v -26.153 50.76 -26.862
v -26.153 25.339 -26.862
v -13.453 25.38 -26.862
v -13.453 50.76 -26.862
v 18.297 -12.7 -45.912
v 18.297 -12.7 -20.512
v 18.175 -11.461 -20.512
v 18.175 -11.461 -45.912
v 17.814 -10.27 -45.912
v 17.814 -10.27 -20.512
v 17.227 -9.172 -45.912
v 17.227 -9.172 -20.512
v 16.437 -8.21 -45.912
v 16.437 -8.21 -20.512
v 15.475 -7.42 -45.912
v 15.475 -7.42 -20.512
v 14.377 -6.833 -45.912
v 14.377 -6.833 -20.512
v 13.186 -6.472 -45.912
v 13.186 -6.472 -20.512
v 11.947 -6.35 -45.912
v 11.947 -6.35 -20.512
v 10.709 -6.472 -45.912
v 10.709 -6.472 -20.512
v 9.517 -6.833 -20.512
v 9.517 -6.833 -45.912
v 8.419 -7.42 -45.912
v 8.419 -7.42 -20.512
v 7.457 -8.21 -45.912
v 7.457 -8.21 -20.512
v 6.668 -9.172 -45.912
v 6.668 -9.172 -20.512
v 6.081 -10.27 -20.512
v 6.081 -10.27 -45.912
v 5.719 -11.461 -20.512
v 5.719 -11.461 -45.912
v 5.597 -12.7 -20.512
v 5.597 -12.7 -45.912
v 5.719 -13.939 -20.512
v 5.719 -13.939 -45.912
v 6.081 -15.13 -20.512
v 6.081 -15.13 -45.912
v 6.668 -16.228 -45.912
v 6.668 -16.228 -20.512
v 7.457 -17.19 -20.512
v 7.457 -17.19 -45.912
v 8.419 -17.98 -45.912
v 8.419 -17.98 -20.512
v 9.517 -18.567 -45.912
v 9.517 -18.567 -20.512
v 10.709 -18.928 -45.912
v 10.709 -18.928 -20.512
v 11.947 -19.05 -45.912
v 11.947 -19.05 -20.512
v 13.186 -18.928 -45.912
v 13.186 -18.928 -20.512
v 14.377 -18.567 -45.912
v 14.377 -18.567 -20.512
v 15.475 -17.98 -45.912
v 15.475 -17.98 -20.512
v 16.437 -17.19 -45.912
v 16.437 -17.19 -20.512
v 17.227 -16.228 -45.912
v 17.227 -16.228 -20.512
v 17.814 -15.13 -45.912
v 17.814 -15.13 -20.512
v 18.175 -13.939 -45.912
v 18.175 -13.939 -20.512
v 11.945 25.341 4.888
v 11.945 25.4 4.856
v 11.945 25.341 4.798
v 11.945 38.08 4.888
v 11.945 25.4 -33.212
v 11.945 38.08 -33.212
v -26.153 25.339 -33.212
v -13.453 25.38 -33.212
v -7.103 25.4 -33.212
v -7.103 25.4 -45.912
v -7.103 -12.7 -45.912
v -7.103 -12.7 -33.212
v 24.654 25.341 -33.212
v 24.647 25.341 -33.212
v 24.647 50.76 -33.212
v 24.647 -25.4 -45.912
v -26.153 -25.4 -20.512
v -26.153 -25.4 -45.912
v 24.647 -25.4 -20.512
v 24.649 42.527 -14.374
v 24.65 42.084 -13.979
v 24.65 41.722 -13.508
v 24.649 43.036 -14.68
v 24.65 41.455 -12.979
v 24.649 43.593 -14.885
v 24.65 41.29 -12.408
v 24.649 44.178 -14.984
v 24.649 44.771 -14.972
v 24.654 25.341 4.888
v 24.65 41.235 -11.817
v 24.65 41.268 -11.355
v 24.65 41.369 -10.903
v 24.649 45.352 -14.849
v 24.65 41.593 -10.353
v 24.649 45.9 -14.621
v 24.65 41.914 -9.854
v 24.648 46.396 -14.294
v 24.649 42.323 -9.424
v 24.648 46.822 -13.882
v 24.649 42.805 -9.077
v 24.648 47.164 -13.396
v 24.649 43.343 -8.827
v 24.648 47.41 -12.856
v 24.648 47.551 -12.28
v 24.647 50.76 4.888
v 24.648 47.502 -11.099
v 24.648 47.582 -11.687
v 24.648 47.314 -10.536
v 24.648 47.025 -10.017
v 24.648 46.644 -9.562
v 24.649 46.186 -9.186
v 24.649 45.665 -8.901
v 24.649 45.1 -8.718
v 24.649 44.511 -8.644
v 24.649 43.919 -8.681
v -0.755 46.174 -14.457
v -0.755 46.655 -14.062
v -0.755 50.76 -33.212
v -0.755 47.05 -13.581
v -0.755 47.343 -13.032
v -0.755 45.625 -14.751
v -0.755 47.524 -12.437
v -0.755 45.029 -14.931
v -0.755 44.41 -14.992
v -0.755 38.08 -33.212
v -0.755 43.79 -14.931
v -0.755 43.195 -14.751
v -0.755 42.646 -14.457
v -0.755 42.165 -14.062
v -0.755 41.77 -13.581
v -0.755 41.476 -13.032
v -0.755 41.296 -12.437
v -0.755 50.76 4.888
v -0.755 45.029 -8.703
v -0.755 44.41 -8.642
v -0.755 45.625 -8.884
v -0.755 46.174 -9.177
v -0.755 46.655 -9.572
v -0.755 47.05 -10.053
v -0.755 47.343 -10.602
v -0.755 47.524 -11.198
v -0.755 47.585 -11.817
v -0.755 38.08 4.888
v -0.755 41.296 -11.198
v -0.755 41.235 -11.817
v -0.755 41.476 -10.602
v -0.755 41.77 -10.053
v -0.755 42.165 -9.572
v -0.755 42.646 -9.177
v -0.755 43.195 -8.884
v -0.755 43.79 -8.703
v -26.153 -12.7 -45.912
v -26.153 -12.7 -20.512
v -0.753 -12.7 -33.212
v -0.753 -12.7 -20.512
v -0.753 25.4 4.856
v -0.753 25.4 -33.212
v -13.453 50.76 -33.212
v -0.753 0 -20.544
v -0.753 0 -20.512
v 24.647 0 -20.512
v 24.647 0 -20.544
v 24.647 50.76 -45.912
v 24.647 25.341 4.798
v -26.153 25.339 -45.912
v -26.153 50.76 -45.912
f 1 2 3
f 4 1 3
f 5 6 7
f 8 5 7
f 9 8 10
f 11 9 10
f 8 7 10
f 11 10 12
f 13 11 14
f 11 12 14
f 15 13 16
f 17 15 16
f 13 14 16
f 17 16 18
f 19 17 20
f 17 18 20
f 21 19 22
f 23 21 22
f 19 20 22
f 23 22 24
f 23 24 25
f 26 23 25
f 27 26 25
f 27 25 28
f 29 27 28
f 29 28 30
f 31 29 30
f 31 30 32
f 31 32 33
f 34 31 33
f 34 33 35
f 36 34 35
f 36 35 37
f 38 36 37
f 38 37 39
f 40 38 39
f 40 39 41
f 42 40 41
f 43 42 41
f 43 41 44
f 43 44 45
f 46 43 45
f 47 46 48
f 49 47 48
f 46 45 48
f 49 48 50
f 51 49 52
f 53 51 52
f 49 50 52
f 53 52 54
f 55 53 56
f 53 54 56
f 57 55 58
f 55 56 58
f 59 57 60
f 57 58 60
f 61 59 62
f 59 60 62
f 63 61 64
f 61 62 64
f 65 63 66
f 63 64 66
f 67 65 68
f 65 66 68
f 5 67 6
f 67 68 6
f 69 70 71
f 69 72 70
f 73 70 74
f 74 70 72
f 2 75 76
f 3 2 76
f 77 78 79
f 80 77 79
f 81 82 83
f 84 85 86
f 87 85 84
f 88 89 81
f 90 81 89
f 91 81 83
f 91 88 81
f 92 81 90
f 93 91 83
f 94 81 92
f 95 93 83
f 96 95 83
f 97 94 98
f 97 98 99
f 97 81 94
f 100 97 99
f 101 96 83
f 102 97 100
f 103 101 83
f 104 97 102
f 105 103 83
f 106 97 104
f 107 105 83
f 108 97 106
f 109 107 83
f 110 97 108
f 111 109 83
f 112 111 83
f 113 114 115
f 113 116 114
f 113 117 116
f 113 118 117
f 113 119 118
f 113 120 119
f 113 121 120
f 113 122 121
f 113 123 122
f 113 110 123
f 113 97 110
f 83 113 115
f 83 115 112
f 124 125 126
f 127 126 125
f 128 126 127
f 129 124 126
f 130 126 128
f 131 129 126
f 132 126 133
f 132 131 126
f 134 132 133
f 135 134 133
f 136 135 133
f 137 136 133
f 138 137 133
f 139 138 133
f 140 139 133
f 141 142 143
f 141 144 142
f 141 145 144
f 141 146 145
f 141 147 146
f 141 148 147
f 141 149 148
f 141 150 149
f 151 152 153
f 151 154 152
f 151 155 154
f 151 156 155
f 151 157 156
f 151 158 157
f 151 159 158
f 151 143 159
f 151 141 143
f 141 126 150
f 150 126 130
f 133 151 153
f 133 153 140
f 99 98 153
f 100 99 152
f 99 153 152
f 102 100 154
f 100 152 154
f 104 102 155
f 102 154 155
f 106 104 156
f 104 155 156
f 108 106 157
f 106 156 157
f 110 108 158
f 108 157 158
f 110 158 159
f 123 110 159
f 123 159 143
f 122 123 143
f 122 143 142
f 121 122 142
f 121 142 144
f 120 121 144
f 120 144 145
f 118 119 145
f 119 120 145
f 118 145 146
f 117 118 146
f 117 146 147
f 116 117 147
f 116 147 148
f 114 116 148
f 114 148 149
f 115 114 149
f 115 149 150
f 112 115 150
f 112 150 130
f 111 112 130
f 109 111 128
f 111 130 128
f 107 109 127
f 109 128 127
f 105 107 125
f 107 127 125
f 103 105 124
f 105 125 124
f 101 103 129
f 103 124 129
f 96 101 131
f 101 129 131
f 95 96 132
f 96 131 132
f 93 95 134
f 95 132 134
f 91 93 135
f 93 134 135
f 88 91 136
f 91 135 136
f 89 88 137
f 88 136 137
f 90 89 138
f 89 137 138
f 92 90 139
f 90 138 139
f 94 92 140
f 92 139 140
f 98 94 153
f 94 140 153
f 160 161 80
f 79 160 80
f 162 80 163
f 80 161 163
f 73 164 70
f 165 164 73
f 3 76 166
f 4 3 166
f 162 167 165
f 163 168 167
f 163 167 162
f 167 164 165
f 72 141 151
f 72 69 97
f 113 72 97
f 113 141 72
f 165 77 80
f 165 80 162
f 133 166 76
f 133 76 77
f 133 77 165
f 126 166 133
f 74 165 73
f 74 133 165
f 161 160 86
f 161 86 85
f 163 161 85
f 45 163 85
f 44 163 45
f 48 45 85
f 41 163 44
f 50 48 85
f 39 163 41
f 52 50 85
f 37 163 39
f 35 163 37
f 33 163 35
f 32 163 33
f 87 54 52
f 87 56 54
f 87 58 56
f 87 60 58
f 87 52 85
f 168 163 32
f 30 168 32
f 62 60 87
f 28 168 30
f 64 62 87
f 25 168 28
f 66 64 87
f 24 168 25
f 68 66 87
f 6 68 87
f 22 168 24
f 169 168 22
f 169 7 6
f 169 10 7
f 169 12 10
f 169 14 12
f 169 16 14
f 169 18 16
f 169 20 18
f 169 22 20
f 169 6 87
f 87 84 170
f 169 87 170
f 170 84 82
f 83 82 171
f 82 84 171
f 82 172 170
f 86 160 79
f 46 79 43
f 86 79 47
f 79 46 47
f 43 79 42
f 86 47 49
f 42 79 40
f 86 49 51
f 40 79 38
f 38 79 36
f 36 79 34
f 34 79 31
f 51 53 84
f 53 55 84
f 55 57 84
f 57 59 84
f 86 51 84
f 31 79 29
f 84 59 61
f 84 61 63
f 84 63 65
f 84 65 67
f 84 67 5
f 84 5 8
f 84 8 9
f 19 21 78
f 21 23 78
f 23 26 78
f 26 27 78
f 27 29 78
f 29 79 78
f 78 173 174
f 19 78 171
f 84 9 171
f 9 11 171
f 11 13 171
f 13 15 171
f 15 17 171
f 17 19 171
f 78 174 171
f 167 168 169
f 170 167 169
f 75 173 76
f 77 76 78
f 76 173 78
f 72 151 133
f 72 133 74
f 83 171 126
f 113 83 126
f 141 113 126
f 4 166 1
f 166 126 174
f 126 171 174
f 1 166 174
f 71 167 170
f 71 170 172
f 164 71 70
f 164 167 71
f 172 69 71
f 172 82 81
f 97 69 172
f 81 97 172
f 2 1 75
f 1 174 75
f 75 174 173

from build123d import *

# Parameters (mm, degrees)
F0_W      = 50.8
F0_H      = 25.4
F1_DEPTH  = 25.4
F2_W      = 25.4
F2_H      = 12.7
F2_R      = 6.35
F3_DEPTH  = 25.401
F6_DEPTH  = 25.4
F9_DEPTH  = 38.1
F12_DEPTH = 12.7
F14_DEPTH = 6.35
F15_R     = 3.175
F16_DEPTH = 25.4096862922
F17_DEPTH = 38.1322003911


with BuildPart() as f1:
    # F0 (on Front) → F1 (new body)
    with BuildSketch(Plane.XZ):
        with Locations((-0.7526604459, -33.2124557674)):
            Rectangle(F0_W, F0_H)
    extrude(amount=F1_DEPTH)

    # F2 (on face) → F3 (cut, through all)
    with BuildSketch(Plane.XY.offset(-20.5124557674)):
        with Locations((-13.4526604459, -6.35)):
            Rectangle(F2_W, F2_H)
        with Locations((11.9473395541, -12.7)):
            Circle(F2_R)
    extrude(amount=-F3_DEPTH, mode=Mode.SUBTRACT)

    # F5 (on offset) → F6 (join)
    with BuildSketch(Plane(origin=(-0.7526604459, 0, 0), x_dir=(0, -1, 0), z_dir=(-1, 0, 0))):
        Polygon((0, -20.5436561584), (-25.4, 4.8563438416), (-25.4, -33.2436561584), (12.6998899505, -33.2436561584), align=None)
    extrude(amount=-F6_DEPTH)

    # F8 (on offset) → F9 (join)
    with BuildSketch(Plane.XY.offset(4.8875442326)):
        Polygon((-0.7548585206, 50.7596358657), (-0.7548585206, 38.0798179328), (11.9451414794, 38.0798179328), (11.9451414794, 25.3414772451), (24.6538277715, 25.3411643207), (24.6473395541, 50.7596358657), align=None)
    extrude(amount=-F9_DEPTH)

    # F11 (on offset) → F12 (join)
    with BuildSketch(Plane.XY.offset(-45.9124557674)):
        Polygon((24.6473395541, 50.7596358657), (-0.7548585206, 50.7596358657), (-26.1525642636, 50.7596358657), (-26.1525642636, 25.3394645815), (-7.1026604459, 25.4), (-7.1026604459, -12.7), (-0.7526574773, -12.7), (-0.7526574773, 0), (24.6473395541, 0), align=None)
    extrude(amount=F12_DEPTH)

    # F13 (on face) → F14 (join)
    with BuildSketch(Plane.XY.offset(-33.2124557674)):
        Polygon((-13.4525642636, 25.3798217309), (-13.4525642636, 50.7596358657), (-26.1525642636, 50.7596358657), (-26.1525642636, 25.3394645815), align=None)
    extrude(amount=F14_DEPTH)

    # F15 (on face) → F16 (cut, through all)
    with BuildSketch(Plane(origin=(-0.7548585206, 0, 0), x_dir=(0, -1, 0), z_dir=(-1, 0, 0))):
        with Locations((-44.4096358657, -11.8173363179)):
            Circle(F15_R)
    extrude(amount=-F16_DEPTH, mode=Mode.SUBTRACT)

    # F17 (cut, through all): a face of the model
    f17_faces = [f1.faces().sort_by_distance(p)[0] for p in [
        (11.9473395541, -10.0049168283, -33.2436561584),
    ]]
    extrude(f17_faces, amount=-F17_DEPTH, mode=Mode.SUBTRACT)


solid = f1.part
